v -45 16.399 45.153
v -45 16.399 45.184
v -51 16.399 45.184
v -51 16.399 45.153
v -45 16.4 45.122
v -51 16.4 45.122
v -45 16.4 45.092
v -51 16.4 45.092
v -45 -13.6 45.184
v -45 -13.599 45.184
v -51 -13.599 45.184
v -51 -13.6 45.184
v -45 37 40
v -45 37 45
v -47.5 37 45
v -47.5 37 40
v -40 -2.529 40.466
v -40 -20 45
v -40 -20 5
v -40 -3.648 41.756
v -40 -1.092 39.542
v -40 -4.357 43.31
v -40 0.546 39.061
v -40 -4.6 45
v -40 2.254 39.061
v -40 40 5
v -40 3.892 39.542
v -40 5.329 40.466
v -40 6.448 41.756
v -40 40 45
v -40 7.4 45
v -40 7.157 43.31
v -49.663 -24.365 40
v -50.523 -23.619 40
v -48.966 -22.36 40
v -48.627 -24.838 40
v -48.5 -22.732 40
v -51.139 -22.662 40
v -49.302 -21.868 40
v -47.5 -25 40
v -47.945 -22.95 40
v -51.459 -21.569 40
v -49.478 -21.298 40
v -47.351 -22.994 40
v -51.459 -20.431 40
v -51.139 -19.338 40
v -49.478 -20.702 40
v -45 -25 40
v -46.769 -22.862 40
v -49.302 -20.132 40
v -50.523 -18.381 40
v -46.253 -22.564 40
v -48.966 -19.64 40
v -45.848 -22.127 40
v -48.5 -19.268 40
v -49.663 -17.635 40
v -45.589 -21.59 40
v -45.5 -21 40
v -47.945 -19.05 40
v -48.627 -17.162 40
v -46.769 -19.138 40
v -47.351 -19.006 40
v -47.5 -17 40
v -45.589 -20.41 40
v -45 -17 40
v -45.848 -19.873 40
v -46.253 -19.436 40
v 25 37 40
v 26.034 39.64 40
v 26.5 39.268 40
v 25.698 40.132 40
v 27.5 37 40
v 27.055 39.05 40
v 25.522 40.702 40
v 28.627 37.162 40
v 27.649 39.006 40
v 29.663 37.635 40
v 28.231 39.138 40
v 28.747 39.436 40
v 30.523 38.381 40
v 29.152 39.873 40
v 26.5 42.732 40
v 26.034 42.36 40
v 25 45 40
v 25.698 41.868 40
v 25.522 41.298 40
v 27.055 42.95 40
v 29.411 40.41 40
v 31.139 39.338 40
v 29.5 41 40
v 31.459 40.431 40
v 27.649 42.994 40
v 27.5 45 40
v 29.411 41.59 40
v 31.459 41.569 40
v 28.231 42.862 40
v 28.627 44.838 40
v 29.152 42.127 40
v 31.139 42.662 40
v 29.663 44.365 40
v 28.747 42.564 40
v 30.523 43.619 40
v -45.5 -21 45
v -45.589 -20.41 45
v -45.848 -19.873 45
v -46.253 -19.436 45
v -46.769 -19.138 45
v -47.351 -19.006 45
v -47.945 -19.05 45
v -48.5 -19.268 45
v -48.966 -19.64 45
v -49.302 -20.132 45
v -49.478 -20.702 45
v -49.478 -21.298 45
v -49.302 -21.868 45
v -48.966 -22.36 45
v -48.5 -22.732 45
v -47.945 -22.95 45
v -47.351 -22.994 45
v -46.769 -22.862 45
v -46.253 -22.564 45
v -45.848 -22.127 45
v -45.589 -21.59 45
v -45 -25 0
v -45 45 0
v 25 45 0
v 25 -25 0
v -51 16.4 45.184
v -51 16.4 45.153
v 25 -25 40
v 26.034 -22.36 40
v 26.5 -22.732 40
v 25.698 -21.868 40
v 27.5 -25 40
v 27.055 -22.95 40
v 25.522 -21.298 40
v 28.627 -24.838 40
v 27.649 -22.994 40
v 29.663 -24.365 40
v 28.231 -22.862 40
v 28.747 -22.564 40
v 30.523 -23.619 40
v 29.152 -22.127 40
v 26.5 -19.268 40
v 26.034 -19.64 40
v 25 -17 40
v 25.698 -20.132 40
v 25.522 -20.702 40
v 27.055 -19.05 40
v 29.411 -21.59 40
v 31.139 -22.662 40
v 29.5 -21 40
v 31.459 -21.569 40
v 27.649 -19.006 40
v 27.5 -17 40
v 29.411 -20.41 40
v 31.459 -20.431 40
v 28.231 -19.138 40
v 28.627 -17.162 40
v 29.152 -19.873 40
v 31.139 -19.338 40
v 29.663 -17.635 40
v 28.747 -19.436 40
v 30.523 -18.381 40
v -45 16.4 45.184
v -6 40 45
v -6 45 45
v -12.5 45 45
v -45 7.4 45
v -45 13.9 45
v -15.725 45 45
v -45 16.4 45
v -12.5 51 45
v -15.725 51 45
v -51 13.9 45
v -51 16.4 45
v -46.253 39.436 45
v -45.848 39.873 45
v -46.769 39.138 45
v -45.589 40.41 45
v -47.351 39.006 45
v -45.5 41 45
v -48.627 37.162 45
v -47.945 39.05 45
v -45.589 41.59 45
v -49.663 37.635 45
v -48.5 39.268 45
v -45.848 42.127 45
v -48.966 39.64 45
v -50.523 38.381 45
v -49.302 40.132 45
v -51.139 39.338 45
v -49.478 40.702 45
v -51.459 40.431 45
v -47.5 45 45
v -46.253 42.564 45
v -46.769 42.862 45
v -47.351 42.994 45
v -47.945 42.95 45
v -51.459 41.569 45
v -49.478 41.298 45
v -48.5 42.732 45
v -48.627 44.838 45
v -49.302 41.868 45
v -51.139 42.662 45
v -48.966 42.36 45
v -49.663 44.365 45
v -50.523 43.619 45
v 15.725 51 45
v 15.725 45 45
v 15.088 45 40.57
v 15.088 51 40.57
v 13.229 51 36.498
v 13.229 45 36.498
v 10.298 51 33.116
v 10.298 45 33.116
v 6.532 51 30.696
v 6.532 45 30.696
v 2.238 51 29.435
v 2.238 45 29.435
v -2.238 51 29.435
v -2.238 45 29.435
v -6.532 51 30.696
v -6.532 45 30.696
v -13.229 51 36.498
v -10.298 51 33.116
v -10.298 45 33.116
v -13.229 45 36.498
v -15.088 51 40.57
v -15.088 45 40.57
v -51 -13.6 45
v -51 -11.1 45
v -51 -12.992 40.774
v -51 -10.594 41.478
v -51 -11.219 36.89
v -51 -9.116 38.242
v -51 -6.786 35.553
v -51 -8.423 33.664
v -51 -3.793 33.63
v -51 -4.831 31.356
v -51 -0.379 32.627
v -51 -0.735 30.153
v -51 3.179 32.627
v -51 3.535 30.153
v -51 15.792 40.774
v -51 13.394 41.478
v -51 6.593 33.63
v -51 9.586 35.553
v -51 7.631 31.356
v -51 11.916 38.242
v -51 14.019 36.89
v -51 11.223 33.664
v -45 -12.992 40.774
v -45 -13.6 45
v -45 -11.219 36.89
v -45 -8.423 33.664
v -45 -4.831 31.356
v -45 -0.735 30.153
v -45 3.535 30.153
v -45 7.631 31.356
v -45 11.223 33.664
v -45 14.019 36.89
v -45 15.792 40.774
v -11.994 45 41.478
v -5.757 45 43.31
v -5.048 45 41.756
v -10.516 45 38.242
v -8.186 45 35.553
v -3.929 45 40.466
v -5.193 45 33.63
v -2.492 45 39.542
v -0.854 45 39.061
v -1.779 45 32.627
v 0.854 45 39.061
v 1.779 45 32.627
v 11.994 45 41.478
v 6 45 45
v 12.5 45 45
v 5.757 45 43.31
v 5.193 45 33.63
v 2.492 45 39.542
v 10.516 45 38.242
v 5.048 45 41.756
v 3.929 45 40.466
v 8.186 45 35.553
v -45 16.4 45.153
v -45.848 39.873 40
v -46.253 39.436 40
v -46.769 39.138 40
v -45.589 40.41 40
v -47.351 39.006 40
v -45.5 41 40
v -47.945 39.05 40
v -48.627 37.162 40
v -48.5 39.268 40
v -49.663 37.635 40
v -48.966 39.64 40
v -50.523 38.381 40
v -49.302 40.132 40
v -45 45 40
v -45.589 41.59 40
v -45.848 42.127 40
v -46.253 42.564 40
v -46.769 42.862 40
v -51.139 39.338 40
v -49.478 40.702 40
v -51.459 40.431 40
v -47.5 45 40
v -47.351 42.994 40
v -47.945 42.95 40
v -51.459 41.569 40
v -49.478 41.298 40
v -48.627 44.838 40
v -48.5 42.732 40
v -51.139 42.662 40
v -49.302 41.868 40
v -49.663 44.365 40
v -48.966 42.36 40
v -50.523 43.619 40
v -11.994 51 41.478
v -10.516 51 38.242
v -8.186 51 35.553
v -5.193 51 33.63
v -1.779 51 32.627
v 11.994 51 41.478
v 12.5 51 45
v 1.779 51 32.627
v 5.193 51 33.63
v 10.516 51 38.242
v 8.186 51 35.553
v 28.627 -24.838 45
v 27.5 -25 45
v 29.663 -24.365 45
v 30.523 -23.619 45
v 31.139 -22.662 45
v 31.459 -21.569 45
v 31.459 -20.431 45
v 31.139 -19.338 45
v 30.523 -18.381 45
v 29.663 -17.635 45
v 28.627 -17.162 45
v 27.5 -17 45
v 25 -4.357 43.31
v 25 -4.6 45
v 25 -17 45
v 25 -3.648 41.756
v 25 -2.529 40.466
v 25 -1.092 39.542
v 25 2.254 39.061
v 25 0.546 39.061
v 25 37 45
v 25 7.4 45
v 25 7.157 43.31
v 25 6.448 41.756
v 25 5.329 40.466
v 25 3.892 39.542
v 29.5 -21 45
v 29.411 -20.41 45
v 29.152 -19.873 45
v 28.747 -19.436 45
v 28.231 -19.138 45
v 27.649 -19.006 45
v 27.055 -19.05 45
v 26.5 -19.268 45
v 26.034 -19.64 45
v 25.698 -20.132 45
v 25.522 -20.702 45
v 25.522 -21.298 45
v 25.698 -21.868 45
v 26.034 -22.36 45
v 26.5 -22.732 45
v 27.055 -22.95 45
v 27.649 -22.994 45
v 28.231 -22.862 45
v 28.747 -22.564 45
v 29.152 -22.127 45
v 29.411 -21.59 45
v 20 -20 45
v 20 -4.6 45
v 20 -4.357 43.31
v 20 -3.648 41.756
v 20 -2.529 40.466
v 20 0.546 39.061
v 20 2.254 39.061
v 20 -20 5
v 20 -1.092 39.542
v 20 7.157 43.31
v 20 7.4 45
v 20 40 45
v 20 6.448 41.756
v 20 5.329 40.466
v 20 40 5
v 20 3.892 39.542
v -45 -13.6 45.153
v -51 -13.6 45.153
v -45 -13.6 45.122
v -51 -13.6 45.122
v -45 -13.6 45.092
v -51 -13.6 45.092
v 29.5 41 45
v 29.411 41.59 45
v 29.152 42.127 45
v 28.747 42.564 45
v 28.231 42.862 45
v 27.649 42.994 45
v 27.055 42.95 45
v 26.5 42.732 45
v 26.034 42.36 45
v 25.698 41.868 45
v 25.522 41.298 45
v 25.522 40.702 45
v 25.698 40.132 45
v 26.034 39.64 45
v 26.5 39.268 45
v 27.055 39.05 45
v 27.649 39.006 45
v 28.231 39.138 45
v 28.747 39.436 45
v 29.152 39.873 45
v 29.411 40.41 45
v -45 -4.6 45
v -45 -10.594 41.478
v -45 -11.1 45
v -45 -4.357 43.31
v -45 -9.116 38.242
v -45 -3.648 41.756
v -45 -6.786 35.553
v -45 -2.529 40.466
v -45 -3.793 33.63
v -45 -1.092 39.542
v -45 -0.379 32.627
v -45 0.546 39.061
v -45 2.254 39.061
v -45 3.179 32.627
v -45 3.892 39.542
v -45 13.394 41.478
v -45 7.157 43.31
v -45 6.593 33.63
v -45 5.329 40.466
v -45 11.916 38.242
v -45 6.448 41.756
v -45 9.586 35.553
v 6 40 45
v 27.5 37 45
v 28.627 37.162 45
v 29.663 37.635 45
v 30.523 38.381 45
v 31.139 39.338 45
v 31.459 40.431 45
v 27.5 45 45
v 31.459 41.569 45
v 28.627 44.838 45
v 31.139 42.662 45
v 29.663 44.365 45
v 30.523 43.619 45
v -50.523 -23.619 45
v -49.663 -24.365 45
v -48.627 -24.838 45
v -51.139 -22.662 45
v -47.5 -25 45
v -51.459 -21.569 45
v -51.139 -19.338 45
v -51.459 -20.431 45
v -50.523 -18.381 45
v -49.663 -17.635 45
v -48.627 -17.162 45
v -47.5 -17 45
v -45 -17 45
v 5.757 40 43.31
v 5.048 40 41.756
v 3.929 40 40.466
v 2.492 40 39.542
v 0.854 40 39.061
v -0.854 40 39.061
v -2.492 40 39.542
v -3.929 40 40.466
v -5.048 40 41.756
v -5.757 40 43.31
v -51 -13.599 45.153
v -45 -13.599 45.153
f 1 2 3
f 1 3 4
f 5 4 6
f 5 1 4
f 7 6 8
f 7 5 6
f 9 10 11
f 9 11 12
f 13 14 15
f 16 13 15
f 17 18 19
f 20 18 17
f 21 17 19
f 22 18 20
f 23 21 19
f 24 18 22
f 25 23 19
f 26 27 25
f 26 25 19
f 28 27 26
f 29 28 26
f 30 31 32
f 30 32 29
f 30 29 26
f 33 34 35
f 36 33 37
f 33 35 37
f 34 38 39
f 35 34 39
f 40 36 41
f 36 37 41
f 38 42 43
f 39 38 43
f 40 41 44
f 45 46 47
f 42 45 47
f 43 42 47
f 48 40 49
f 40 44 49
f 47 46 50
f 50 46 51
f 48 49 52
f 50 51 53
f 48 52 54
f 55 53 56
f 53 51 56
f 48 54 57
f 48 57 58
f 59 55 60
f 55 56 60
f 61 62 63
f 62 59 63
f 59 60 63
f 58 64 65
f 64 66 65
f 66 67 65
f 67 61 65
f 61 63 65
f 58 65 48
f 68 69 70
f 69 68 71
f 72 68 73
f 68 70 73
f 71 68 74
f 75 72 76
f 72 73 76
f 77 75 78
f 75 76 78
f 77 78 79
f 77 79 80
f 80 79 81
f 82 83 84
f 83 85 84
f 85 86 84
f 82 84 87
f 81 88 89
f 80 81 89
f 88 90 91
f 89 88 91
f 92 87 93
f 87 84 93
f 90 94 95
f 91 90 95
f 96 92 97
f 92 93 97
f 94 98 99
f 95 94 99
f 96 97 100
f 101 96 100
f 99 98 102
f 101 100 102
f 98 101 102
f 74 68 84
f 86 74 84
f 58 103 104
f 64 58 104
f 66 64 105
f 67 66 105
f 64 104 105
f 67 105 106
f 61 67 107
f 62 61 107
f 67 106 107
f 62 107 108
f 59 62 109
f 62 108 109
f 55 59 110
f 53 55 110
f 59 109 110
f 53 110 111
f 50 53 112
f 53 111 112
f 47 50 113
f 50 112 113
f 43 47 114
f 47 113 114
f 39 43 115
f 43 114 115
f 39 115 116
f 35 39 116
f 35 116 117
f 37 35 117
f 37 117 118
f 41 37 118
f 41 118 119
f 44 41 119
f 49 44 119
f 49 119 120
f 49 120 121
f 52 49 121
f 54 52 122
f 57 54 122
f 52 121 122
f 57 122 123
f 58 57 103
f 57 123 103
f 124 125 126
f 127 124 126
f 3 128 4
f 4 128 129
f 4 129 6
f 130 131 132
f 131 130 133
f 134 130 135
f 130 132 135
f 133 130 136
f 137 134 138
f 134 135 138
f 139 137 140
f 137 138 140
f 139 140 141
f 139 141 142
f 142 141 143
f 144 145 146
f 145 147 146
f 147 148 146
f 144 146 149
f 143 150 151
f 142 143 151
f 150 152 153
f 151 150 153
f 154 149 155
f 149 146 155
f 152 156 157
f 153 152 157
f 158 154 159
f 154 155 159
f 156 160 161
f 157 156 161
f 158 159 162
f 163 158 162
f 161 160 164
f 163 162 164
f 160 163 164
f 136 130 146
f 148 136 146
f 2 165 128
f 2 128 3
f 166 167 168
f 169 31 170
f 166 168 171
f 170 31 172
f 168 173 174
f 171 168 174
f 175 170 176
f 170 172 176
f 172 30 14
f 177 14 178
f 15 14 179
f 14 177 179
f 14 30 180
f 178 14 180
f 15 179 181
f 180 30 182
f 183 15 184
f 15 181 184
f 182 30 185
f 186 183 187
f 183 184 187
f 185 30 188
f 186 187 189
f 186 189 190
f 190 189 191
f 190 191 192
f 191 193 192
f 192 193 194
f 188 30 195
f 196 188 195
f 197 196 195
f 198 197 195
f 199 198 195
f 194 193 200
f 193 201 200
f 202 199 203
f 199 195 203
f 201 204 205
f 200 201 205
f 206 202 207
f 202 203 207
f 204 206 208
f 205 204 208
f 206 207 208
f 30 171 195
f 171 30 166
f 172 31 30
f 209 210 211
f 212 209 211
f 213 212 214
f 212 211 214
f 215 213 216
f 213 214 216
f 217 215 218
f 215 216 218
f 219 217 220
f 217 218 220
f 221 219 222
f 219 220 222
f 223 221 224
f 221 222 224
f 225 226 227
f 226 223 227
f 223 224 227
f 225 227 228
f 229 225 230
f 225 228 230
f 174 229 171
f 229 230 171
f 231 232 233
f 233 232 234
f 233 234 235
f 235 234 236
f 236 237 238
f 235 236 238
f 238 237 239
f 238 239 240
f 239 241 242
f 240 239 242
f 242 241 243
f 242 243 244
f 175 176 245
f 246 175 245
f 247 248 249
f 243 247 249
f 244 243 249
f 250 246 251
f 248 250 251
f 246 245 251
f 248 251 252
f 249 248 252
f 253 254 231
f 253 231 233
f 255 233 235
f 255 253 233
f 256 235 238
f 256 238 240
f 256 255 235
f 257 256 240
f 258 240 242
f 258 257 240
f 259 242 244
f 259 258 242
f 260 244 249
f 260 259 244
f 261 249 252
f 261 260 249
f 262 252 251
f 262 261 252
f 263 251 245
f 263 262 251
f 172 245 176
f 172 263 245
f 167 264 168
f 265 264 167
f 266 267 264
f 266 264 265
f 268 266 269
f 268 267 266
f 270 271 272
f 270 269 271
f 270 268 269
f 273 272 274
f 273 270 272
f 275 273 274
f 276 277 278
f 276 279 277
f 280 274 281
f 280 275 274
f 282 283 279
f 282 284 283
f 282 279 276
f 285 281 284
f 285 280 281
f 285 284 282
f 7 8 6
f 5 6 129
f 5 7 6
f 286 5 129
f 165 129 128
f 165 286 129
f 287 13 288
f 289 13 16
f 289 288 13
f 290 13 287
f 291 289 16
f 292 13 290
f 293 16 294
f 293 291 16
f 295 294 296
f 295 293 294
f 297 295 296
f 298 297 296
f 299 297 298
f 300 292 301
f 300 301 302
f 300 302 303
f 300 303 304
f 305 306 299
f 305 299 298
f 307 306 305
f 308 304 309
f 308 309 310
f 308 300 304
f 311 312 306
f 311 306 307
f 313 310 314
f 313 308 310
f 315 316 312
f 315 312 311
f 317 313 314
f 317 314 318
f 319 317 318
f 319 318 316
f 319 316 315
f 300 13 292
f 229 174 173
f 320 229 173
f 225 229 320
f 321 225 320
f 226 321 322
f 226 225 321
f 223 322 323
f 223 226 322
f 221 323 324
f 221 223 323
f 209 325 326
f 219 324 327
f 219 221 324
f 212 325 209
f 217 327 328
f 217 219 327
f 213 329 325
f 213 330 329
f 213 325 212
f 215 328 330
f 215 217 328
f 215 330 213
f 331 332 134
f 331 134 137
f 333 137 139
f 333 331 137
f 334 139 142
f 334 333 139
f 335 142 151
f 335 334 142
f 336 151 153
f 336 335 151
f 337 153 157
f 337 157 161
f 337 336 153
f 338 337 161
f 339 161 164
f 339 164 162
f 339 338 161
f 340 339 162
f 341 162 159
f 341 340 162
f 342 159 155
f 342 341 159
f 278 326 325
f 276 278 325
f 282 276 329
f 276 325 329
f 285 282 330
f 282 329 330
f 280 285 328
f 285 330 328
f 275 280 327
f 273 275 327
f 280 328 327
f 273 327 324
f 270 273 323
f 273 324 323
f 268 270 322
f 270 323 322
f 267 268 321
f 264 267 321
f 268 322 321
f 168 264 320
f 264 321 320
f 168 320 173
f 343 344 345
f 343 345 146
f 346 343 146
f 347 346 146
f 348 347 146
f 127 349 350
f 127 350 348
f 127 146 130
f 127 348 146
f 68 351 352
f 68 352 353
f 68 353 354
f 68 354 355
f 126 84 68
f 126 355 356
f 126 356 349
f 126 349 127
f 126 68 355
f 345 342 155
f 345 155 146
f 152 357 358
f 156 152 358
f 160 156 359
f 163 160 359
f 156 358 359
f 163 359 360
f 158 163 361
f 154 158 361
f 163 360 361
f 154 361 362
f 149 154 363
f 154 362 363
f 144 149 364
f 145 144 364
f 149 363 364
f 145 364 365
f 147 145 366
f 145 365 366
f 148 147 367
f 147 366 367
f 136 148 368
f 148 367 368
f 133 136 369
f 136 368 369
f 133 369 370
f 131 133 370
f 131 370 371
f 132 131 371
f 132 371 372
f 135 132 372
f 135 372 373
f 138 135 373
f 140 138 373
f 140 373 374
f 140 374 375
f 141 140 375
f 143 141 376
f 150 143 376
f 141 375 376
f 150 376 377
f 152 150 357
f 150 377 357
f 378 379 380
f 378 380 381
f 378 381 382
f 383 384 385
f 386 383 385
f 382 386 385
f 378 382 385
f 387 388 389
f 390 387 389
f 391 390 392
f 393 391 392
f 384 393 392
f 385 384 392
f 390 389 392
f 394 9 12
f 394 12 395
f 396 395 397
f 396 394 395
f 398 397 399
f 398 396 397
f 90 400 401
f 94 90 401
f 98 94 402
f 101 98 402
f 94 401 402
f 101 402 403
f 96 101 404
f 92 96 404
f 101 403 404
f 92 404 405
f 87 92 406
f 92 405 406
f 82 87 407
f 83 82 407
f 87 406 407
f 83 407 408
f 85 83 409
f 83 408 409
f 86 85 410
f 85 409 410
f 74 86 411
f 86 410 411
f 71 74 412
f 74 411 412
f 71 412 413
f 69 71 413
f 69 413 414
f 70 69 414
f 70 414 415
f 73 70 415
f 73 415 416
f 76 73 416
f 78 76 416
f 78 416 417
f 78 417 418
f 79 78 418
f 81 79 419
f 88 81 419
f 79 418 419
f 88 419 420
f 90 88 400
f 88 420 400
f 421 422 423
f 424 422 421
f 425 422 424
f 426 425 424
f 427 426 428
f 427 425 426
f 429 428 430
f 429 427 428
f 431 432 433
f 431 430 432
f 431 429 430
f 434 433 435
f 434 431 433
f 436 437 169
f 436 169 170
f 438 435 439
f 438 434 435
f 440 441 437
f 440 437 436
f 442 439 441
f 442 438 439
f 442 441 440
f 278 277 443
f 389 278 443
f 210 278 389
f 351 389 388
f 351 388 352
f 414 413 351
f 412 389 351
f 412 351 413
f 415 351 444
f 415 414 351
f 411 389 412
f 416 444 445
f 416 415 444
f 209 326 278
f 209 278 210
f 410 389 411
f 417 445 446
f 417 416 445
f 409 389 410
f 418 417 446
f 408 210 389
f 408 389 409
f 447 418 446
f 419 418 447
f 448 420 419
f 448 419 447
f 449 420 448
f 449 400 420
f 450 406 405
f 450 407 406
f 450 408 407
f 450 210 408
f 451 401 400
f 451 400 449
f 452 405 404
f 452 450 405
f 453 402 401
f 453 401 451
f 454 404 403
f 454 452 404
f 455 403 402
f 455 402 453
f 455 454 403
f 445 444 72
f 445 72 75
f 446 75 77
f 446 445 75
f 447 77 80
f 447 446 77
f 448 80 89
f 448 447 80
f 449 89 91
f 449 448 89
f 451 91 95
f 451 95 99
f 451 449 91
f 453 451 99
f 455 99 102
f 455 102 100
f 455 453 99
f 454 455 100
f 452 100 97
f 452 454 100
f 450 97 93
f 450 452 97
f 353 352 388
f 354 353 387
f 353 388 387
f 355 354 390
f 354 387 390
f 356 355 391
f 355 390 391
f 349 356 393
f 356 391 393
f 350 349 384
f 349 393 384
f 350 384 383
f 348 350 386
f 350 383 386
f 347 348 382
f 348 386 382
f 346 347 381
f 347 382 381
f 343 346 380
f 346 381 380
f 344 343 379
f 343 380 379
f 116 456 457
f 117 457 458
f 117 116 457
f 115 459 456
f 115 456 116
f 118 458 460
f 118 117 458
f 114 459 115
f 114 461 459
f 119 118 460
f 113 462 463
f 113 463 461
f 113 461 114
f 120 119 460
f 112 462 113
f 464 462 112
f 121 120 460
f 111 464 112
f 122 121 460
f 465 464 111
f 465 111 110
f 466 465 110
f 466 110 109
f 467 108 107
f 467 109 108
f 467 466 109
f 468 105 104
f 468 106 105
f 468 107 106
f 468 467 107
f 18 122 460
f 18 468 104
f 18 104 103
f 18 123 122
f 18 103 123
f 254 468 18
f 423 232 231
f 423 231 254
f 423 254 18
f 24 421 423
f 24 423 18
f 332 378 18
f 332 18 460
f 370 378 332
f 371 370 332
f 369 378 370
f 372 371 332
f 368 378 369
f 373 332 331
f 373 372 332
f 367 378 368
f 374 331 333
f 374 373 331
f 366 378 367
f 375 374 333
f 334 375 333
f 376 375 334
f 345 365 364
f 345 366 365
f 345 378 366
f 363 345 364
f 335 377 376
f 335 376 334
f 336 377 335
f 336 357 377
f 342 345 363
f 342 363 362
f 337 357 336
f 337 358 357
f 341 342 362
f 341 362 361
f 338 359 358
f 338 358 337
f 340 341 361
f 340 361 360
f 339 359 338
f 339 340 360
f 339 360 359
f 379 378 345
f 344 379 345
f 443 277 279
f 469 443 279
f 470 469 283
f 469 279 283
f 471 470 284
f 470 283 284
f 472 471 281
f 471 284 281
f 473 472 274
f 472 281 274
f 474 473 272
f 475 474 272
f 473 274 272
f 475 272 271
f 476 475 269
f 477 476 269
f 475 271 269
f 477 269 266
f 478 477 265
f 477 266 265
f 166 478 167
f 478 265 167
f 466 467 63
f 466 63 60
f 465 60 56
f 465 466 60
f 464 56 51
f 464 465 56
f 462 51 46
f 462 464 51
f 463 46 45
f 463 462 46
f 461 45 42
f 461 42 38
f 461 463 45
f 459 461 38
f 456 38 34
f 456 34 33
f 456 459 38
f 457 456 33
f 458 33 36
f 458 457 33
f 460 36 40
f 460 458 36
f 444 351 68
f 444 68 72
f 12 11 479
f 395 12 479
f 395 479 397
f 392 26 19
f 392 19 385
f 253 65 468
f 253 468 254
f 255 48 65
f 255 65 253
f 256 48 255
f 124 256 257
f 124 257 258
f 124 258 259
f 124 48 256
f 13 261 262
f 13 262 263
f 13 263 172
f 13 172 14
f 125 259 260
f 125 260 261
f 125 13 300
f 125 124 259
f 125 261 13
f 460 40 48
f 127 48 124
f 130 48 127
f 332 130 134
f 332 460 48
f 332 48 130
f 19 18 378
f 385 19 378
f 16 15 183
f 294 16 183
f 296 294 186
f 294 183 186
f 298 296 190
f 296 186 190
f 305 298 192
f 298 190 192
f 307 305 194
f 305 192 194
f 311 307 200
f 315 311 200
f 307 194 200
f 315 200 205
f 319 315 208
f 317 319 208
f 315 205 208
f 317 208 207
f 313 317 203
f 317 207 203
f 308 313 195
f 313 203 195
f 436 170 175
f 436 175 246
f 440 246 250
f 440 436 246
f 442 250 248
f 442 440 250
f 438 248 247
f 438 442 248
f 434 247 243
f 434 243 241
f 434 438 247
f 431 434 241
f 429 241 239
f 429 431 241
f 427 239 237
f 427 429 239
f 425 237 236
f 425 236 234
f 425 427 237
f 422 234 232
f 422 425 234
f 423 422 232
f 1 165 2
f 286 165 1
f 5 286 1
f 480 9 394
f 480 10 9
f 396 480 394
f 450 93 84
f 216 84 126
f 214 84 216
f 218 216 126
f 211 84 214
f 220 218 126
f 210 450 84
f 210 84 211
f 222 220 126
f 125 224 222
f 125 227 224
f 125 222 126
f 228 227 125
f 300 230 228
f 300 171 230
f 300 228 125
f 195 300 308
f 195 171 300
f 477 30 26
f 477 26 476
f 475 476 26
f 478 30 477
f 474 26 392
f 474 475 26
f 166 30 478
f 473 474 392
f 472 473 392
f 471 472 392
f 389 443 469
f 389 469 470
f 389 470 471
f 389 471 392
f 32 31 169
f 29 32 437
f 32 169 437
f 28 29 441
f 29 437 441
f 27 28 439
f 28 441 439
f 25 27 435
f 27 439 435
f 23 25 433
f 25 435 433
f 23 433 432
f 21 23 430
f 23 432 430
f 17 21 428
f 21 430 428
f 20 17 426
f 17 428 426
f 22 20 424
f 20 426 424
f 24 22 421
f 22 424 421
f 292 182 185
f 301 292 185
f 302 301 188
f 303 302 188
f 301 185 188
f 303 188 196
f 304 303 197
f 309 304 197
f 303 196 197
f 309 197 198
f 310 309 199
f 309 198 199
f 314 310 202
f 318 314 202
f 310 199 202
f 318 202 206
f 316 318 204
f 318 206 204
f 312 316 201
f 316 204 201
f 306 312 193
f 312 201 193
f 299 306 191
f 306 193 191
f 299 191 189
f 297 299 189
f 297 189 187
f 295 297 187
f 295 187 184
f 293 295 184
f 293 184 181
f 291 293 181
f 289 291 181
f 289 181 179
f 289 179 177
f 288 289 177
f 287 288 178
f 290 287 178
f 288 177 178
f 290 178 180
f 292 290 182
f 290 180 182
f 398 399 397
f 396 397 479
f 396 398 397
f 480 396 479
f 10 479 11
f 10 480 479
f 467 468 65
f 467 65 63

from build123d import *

# Parameters (mm, degrees)
SKETCH_1_W               = 90
SKETCH_1_H               = 90
EXTRUDE_2_DEPTH          = 45
SKETCH_2_W               = 80
SKETCH_2_H               = 80
CUT_EXTRUDE_1_DEPTH      = 40
EXTRUDE_3_DEPTH          = 10
SKETCH_4_R               = 1
EXTRUDE_4_DEPTH          = 2
SKETCH_5_R               = 6
CUT_EXTRUDE_2_DEPTH      = 30
EXTRUDE_5_DEPTH          = 6
CUT_EXTRUDE_START        = -2
CUT_EXTRUDE_3_DEPTH      = 6
SKETCH_8_R               = 12.5
CUT_EXTRUDE_4_DEPTH      = 6
SKETCH_9_R               = 6
CUT_EXTRUDE_5_DEPTH      = 500
SKETCH_10_R              = 2
EXTRUDE_6_DEPTH          = 5
CUT_EXTRUDE_6_DEPTH      = 86.393013363
CUT_EXTRUDE_6_DEPTH_BACK = 86.393013363
EXTRUDE_8_DEPTH          = 5
EXTRUDE_9_REACH          = 89.762
SKETCH_13_W              = 70
SKETCH_13_H              = 5
SKETCH_14_R              = 2
SKETCH_14_W              = 3.535716984
SKETCH_14_H              = 8
EXTRUDE_10_DEPTH         = 5
SKETCH_15_R              = 15
CUT_EXTRUDE_7_DEPTH      = 30
SKETCH_16_R              = 34.759531797
CUT_EXTRUDE_8_DEPTH      = 4
SKETCH_17_R              = 12.5
CUT_EXTRUDE_9_DEPTH      = 6
SKETCH_18_R              = 6
CUT_EXTRUDE_10_DEPTH     = 10
EXTRUDE_11_DEPTH         = 6


with BuildPart() as part:
    # 草图1 → 凸台-拉伸2 (new body)
    with BuildSketch(Plane.XY):
        Rectangle(SKETCH_1_W, SKETCH_1_H)
    extrude(amount=EXTRUDE_2_DEPTH)

    # 草图2 → 切除-拉伸1 (cut)
    with BuildSketch(Plane.XY.offset(45)):
        Rectangle(SKETCH_2_W, SKETCH_2_H)
    extrude(amount=-CUT_EXTRUDE_1_DEPTH, mode=Mode.SUBTRACT)

    # 草图3 → 凸台-拉伸3 (add)
    with BuildSketch(Plane(origin=(0, 45, 0), x_dir=(1, 0, 0), z_dir=(0, 1, 0))):
        with BuildLine():
            Line((-15.725, -45), (15.725, -45))
            ThreePointArc((15.725, -45), (0, -29.275), (-15.725, -45))
        make_face()
    extrude(amount=EXTRUDE_3_DEPTH)

    # 草图4 → 凸台-拉伸4 (add)
    with BuildSketch(Plane(origin=(0, 55, 0), x_dir=(1, 0, 0), z_dir=(0, 1, 0))):
        with BuildLine():
            Line((-13.344644505, -28.920245738), (13.344644505, -28.920245738))
            ThreePointArc((13.344644505, -28.920245738), (16.17307163, -30.091818614), (17.344644505, -32.920245738))
            Line((17.344644505, -32.920245738), (17.344644505, -45))
            Line((17.344644505, -45), (-17.344644505, -45))
            Line((-17.344644505, -45), (-17.344644505, -32.920245738))
            ThreePointArc((-17.344644505, -32.920245738), (-16.17307163, -30.091818614), (-13.344644505, -28.920245738))
        make_face()
        with Locations(Location((13.344644505, -32.920245738, 0), (0, 0, 270))):
            Circle(SKETCH_4_R, mode=Mode.SUBTRACT)
        with Locations(Location((-13.344644505, -32.920245738, 0), (0, 0, 270))):
            Circle(SKETCH_4_R, mode=Mode.SUBTRACT)
    extrude(amount=-EXTRUDE_4_DEPTH)

    # 草图5 → 切除-拉伸2 (cut)
    with BuildSketch(Plane(origin=(0, 55, 0), x_dir=(1, 0, 0), z_dir=(0, 1, 0))):
        with Locations((0, -45)):
            Circle(SKETCH_5_R)
    extrude(amount=-CUT_EXTRUDE_2_DEPTH, mode=Mode.SUBTRACT)

    # 草图6 → 凸台-拉伸5 (add)
    with BuildSketch(Plane.ZY.offset(45)):
        with BuildLine():
            Line((45.183538062, 16.4), (45.183538062, -13.6))
            ThreePointArc((45.183538062, -13.6), (30.183538062, 1.4), (45.183538062, 16.4))
        make_face()
    extrude(amount=EXTRUDE_5_DEPTH)

    # 草图7 → 切除-拉伸3 (cut)
    with BuildSketch(Plane(origin=(0, 55, 0), x_dir=(1, 0, 0), z_dir=(0, 1, 0)).offset(CUT_EXTRUDE_START)):
        with BuildLine():
            Line((-12.5, -45), (12.5, -45))
            ThreePointArc((12.5, -45), (0, -32.5), (-12.5, -45))
        make_face()
    extrude(amount=-CUT_EXTRUDE_3_DEPTH, mode=Mode.SUBTRACT)

    # 草图8 → 切除-拉伸4 (cut)
    with BuildSketch(Plane.ZY.offset(51)):
        with Locations((45.183538062, 1.4)):
            Circle(SKETCH_8_R)
    extrude(amount=-CUT_EXTRUDE_4_DEPTH, mode=Mode.SUBTRACT)

    # 草图9 → 切除-拉伸5 (cut)
    with BuildSketch(Plane.ZY.offset(45)):
        with Locations((45, 1.4)):
            Circle(SKETCH_9_R)
    extrude(amount=-CUT_EXTRUDE_5_DEPTH, mode=Mode.SUBTRACT)

    # 草图10 → 凸台-拉伸6 (add)
    # profile 1 of 4: a face of its own
    with BuildSketch(Plane.XY.offset(45)):
        with BuildLine():
            Line((-47.5, 45), (-42.902808048, 45))
            Line((-42.902808048, 45), (-42.902808048, 37))
            Line((-42.902808048, 37), (-47.5, 37))
            ThreePointArc((-47.5, 37), (-51.5, 41), (-47.5, 45))
        make_face()
        with Locations((-47.5, 41)):
            Circle(SKETCH_10_R, mode=Mode.SUBTRACT)
    # profile 2 of 4: a face of its own
    with BuildSketch(Plane.XY.offset(45)):
        with BuildLine():
            Line((-47.5, -45), (-42.902808048, -45))
            Line((-42.902808048, -45), (-42.902808048, -37))
            Line((-42.902808048, -37), (-47.5, -37))
            ThreePointArc((-47.5, -37), (-51.5, -41), (-47.5, -45))
        make_face()
        with Locations((-47.5, -41)):
            Circle(SKETCH_10_R, mode=Mode.SUBTRACT)
    # profile 3 of 4: a face of its own
    with BuildSketch(Plane.XY.offset(45)):
        with BuildLine():
            Line((42.460881889, 45), (42.460881889, 37))
            Line((42.460881889, 37), (47.5, 37))
            ThreePointArc((47.5, 37), (51.5, 41), (47.5, 45))
            Line((47.5, 45), (42.460881889, 45))
        make_face()
        with Locations((47.5, 41)):
            Circle(SKETCH_10_R, mode=Mode.SUBTRACT)
    # profile 4 of 4: a face of its own
    with BuildSketch(Plane.XY.offset(45)):
        with BuildLine():
            Line((41.065096799, -37), (41.065096799, -45))
            Line((41.065096799, -45), (47.5, -45))
            ThreePointArc((47.5, -45), (51.5, -41), (47.5, -37))
            Line((47.5, -37), (41.065096799, -37))
        make_face()
        with Locations((47.5, -41)):
            Circle(SKETCH_10_R, mode=Mode.SUBTRACT)
    extrude(amount=-EXTRUDE_6_DEPTH)

    # 草图11 → 切除-拉伸6 (cut, two sides: drawn at the far end of the back side and taken through both)
    with BuildSketch(Plane.XY.offset(5).offset(-CUT_EXTRUDE_6_DEPTH_BACK)):
        Polygon((25, 25), (25, 60.762211799), (85.89289348, 60.762211799), (85.89289348, -73.939659246), (-86.710921037, -73.939659246), (-86.710921037, -25), (-25, -25), (25, -25), align=None)
    extrude(amount=CUT_EXTRUDE_6_DEPTH + CUT_EXTRUDE_6_DEPTH_BACK, mode=Mode.SUBTRACT)

    # 草图12 → 凸台-拉伸8 (add)
    with BuildSketch(Plane(origin=(25, 0, 0), x_dir=(0, 0, -1), z_dir=(1, 0, 0))):
        Polygon((-45, 40), (-45, -25), (-5, -25), (0, -25), (0, 45), (-45, 45), align=None)
    extrude(amount=-EXTRUDE_8_DEPTH)

    # 草图13 → 凸台-拉伸9 (add, up to next)
    with BuildSketch(Plane.XY.offset(45), mode=Mode.PRIVATE) as extrude_9_sk1:
        with Locations((-10, -22.5)):
            Rectangle(SKETCH_13_W, SKETCH_13_H)
    extrude_9_tool1 = extrude(extrude_9_sk1.sketch, amount=-EXTRUDE_9_REACH, mode=Mode.PRIVATE) - part.part
    add(extrude_9_tool1.solids().sort_by_distance((-10, -22.5, 45))[0])

    # 草图14 → 凸台-拉伸10 (add)
    # profile 1 of 5: a face of its own
    with BuildSketch(Plane.XY.offset(45)):
        with BuildLine():
            Line((27.5, 45), (25, 45))
            Line((25, 45), (25, 37))
            Line((25, 37), (27.5, 37))
            ThreePointArc((27.5, 37), (31.5, 41), (27.5, 45))
        make_face()
        with Locations((27.5, 41)):
            Circle(SKETCH_14_R, mode=Mode.SUBTRACT)
    # profile 2 of 5: a face of its own
    with BuildSketch(Plane.XY.offset(45)):
        with Locations((-43.232141508, -21)):
            Rectangle(SKETCH_14_W, SKETCH_14_H)
    # profile 3 of 5: a face of its own
    with BuildSketch(Plane.XY.offset(45)):
        with Locations((23.232141508, -21)):
            Rectangle(SKETCH_14_W, SKETCH_14_H)
    # profile 4 of 5: a face of its own
    with BuildSketch(Plane.XY.offset(45)):
        with BuildLine():
            Line((27.5, -17), (25, -17))
            Line((25, -17), (25, -25))
            Line((25, -25), (27.5, -25))
            ThreePointArc((27.5, -25), (31.5, -21), (27.5, -17))
        make_face()
        with Locations((27.5, -21)):
            Circle(SKETCH_14_R, mode=Mode.SUBTRACT)
    # profile 5 of 5: a face of its own
    with BuildSketch(Plane.XY.offset(45)):
        with BuildLine():
            Line((-47.5, -25), (-45, -25))
            Line((-45, -25), (-45, -17))
            Line((-45, -17), (-47.5, -17))
            ThreePointArc((-47.5, -17), (-51.5, -21), (-47.5, -25))
        make_face()
        with Locations((-47.5, -21)):
            Circle(SKETCH_14_R, mode=Mode.SUBTRACT)
    extrude(amount=-EXTRUDE_10_DEPTH)

    # 草图15 → 切除-拉伸7 (cut)
    with BuildSketch(Plane.ZY.offset(45)):
        with Locations((45, 1.4)):
            Circle(SKETCH_15_R)
    extrude(amount=CUT_EXTRUDE_7_DEPTH, mode=Mode.SUBTRACT)


with BuildPart() as cut_extrude_7_piece_1:
    # of the separate pieces the step leaves, piece 1, a body of its own (cut_extrude_7_pieces)
    add(part.part.solids().sort_by_distance((-45, 45, 0))[0])

    # 草图16 → 切除-拉伸8 (cut)
    with BuildSketch(Plane(origin=(0, 55, 0), x_dir=(1, 0, 0), z_dir=(0, 1, 0))):
        with Locations((0, -45)):
            Circle(SKETCH_16_R)
    extrude(amount=-CUT_EXTRUDE_8_DEPTH, mode=Mode.SUBTRACT)

    # 草图17 → 切除-拉伸9 (cut)
    with BuildSketch(Plane(origin=(0, 51, 0), x_dir=(1, 0, 0), z_dir=(0, 1, 0))):
        with Locations((0, -45)):
            Circle(SKETCH_17_R)
    extrude(amount=-CUT_EXTRUDE_9_DEPTH, mode=Mode.SUBTRACT)

    # 草图18 → 切除-拉伸10 (cut)
    with BuildSketch(Plane.ZY.offset(-20)):
        with Locations((45, 1.4)):
            Circle(SKETCH_18_R)
    extrude(amount=-CUT_EXTRUDE_10_DEPTH, mode=Mode.SUBTRACT)

    # 草图19 → 凸台-拉伸11 (add)
    with BuildSketch(Plane.ZY.offset(45)):
        with BuildLine():
            Line((45, 16.4), (45, 13.9))
            ThreePointArc((45, 13.9), (32.5, 1.4), (45, -11.1))
            Line((45, -11.1), (45, -13.6))
            ThreePointArc((45, -13.6), (30, 1.4), (45, 16.4))
        make_face()
    extrude(amount=EXTRUDE_11_DEPTH)


with BuildPart() as cut_extrude_7_piece_2:
    # of the separate pieces the step leaves, piece 2, a body of its own (cut_extrude_7_pieces)
    add(part.part.solids().sort_by_distance((-45, -13.599719279, 45.091769031))[0])


with BuildPart() as cut_extrude_7_piece_3:
    # of the separate pieces the step leaves, piece 3, a body of its own (cut_extrude_7_pieces)
    add(part.part.solids().sort_by_distance((-45, 16.398877084, 45.183538062))[0])


solid = Compound([cut_extrude_7_piece_1.part, cut_extrude_7_piece_2.part, cut_extrude_7_piece_3.part])
